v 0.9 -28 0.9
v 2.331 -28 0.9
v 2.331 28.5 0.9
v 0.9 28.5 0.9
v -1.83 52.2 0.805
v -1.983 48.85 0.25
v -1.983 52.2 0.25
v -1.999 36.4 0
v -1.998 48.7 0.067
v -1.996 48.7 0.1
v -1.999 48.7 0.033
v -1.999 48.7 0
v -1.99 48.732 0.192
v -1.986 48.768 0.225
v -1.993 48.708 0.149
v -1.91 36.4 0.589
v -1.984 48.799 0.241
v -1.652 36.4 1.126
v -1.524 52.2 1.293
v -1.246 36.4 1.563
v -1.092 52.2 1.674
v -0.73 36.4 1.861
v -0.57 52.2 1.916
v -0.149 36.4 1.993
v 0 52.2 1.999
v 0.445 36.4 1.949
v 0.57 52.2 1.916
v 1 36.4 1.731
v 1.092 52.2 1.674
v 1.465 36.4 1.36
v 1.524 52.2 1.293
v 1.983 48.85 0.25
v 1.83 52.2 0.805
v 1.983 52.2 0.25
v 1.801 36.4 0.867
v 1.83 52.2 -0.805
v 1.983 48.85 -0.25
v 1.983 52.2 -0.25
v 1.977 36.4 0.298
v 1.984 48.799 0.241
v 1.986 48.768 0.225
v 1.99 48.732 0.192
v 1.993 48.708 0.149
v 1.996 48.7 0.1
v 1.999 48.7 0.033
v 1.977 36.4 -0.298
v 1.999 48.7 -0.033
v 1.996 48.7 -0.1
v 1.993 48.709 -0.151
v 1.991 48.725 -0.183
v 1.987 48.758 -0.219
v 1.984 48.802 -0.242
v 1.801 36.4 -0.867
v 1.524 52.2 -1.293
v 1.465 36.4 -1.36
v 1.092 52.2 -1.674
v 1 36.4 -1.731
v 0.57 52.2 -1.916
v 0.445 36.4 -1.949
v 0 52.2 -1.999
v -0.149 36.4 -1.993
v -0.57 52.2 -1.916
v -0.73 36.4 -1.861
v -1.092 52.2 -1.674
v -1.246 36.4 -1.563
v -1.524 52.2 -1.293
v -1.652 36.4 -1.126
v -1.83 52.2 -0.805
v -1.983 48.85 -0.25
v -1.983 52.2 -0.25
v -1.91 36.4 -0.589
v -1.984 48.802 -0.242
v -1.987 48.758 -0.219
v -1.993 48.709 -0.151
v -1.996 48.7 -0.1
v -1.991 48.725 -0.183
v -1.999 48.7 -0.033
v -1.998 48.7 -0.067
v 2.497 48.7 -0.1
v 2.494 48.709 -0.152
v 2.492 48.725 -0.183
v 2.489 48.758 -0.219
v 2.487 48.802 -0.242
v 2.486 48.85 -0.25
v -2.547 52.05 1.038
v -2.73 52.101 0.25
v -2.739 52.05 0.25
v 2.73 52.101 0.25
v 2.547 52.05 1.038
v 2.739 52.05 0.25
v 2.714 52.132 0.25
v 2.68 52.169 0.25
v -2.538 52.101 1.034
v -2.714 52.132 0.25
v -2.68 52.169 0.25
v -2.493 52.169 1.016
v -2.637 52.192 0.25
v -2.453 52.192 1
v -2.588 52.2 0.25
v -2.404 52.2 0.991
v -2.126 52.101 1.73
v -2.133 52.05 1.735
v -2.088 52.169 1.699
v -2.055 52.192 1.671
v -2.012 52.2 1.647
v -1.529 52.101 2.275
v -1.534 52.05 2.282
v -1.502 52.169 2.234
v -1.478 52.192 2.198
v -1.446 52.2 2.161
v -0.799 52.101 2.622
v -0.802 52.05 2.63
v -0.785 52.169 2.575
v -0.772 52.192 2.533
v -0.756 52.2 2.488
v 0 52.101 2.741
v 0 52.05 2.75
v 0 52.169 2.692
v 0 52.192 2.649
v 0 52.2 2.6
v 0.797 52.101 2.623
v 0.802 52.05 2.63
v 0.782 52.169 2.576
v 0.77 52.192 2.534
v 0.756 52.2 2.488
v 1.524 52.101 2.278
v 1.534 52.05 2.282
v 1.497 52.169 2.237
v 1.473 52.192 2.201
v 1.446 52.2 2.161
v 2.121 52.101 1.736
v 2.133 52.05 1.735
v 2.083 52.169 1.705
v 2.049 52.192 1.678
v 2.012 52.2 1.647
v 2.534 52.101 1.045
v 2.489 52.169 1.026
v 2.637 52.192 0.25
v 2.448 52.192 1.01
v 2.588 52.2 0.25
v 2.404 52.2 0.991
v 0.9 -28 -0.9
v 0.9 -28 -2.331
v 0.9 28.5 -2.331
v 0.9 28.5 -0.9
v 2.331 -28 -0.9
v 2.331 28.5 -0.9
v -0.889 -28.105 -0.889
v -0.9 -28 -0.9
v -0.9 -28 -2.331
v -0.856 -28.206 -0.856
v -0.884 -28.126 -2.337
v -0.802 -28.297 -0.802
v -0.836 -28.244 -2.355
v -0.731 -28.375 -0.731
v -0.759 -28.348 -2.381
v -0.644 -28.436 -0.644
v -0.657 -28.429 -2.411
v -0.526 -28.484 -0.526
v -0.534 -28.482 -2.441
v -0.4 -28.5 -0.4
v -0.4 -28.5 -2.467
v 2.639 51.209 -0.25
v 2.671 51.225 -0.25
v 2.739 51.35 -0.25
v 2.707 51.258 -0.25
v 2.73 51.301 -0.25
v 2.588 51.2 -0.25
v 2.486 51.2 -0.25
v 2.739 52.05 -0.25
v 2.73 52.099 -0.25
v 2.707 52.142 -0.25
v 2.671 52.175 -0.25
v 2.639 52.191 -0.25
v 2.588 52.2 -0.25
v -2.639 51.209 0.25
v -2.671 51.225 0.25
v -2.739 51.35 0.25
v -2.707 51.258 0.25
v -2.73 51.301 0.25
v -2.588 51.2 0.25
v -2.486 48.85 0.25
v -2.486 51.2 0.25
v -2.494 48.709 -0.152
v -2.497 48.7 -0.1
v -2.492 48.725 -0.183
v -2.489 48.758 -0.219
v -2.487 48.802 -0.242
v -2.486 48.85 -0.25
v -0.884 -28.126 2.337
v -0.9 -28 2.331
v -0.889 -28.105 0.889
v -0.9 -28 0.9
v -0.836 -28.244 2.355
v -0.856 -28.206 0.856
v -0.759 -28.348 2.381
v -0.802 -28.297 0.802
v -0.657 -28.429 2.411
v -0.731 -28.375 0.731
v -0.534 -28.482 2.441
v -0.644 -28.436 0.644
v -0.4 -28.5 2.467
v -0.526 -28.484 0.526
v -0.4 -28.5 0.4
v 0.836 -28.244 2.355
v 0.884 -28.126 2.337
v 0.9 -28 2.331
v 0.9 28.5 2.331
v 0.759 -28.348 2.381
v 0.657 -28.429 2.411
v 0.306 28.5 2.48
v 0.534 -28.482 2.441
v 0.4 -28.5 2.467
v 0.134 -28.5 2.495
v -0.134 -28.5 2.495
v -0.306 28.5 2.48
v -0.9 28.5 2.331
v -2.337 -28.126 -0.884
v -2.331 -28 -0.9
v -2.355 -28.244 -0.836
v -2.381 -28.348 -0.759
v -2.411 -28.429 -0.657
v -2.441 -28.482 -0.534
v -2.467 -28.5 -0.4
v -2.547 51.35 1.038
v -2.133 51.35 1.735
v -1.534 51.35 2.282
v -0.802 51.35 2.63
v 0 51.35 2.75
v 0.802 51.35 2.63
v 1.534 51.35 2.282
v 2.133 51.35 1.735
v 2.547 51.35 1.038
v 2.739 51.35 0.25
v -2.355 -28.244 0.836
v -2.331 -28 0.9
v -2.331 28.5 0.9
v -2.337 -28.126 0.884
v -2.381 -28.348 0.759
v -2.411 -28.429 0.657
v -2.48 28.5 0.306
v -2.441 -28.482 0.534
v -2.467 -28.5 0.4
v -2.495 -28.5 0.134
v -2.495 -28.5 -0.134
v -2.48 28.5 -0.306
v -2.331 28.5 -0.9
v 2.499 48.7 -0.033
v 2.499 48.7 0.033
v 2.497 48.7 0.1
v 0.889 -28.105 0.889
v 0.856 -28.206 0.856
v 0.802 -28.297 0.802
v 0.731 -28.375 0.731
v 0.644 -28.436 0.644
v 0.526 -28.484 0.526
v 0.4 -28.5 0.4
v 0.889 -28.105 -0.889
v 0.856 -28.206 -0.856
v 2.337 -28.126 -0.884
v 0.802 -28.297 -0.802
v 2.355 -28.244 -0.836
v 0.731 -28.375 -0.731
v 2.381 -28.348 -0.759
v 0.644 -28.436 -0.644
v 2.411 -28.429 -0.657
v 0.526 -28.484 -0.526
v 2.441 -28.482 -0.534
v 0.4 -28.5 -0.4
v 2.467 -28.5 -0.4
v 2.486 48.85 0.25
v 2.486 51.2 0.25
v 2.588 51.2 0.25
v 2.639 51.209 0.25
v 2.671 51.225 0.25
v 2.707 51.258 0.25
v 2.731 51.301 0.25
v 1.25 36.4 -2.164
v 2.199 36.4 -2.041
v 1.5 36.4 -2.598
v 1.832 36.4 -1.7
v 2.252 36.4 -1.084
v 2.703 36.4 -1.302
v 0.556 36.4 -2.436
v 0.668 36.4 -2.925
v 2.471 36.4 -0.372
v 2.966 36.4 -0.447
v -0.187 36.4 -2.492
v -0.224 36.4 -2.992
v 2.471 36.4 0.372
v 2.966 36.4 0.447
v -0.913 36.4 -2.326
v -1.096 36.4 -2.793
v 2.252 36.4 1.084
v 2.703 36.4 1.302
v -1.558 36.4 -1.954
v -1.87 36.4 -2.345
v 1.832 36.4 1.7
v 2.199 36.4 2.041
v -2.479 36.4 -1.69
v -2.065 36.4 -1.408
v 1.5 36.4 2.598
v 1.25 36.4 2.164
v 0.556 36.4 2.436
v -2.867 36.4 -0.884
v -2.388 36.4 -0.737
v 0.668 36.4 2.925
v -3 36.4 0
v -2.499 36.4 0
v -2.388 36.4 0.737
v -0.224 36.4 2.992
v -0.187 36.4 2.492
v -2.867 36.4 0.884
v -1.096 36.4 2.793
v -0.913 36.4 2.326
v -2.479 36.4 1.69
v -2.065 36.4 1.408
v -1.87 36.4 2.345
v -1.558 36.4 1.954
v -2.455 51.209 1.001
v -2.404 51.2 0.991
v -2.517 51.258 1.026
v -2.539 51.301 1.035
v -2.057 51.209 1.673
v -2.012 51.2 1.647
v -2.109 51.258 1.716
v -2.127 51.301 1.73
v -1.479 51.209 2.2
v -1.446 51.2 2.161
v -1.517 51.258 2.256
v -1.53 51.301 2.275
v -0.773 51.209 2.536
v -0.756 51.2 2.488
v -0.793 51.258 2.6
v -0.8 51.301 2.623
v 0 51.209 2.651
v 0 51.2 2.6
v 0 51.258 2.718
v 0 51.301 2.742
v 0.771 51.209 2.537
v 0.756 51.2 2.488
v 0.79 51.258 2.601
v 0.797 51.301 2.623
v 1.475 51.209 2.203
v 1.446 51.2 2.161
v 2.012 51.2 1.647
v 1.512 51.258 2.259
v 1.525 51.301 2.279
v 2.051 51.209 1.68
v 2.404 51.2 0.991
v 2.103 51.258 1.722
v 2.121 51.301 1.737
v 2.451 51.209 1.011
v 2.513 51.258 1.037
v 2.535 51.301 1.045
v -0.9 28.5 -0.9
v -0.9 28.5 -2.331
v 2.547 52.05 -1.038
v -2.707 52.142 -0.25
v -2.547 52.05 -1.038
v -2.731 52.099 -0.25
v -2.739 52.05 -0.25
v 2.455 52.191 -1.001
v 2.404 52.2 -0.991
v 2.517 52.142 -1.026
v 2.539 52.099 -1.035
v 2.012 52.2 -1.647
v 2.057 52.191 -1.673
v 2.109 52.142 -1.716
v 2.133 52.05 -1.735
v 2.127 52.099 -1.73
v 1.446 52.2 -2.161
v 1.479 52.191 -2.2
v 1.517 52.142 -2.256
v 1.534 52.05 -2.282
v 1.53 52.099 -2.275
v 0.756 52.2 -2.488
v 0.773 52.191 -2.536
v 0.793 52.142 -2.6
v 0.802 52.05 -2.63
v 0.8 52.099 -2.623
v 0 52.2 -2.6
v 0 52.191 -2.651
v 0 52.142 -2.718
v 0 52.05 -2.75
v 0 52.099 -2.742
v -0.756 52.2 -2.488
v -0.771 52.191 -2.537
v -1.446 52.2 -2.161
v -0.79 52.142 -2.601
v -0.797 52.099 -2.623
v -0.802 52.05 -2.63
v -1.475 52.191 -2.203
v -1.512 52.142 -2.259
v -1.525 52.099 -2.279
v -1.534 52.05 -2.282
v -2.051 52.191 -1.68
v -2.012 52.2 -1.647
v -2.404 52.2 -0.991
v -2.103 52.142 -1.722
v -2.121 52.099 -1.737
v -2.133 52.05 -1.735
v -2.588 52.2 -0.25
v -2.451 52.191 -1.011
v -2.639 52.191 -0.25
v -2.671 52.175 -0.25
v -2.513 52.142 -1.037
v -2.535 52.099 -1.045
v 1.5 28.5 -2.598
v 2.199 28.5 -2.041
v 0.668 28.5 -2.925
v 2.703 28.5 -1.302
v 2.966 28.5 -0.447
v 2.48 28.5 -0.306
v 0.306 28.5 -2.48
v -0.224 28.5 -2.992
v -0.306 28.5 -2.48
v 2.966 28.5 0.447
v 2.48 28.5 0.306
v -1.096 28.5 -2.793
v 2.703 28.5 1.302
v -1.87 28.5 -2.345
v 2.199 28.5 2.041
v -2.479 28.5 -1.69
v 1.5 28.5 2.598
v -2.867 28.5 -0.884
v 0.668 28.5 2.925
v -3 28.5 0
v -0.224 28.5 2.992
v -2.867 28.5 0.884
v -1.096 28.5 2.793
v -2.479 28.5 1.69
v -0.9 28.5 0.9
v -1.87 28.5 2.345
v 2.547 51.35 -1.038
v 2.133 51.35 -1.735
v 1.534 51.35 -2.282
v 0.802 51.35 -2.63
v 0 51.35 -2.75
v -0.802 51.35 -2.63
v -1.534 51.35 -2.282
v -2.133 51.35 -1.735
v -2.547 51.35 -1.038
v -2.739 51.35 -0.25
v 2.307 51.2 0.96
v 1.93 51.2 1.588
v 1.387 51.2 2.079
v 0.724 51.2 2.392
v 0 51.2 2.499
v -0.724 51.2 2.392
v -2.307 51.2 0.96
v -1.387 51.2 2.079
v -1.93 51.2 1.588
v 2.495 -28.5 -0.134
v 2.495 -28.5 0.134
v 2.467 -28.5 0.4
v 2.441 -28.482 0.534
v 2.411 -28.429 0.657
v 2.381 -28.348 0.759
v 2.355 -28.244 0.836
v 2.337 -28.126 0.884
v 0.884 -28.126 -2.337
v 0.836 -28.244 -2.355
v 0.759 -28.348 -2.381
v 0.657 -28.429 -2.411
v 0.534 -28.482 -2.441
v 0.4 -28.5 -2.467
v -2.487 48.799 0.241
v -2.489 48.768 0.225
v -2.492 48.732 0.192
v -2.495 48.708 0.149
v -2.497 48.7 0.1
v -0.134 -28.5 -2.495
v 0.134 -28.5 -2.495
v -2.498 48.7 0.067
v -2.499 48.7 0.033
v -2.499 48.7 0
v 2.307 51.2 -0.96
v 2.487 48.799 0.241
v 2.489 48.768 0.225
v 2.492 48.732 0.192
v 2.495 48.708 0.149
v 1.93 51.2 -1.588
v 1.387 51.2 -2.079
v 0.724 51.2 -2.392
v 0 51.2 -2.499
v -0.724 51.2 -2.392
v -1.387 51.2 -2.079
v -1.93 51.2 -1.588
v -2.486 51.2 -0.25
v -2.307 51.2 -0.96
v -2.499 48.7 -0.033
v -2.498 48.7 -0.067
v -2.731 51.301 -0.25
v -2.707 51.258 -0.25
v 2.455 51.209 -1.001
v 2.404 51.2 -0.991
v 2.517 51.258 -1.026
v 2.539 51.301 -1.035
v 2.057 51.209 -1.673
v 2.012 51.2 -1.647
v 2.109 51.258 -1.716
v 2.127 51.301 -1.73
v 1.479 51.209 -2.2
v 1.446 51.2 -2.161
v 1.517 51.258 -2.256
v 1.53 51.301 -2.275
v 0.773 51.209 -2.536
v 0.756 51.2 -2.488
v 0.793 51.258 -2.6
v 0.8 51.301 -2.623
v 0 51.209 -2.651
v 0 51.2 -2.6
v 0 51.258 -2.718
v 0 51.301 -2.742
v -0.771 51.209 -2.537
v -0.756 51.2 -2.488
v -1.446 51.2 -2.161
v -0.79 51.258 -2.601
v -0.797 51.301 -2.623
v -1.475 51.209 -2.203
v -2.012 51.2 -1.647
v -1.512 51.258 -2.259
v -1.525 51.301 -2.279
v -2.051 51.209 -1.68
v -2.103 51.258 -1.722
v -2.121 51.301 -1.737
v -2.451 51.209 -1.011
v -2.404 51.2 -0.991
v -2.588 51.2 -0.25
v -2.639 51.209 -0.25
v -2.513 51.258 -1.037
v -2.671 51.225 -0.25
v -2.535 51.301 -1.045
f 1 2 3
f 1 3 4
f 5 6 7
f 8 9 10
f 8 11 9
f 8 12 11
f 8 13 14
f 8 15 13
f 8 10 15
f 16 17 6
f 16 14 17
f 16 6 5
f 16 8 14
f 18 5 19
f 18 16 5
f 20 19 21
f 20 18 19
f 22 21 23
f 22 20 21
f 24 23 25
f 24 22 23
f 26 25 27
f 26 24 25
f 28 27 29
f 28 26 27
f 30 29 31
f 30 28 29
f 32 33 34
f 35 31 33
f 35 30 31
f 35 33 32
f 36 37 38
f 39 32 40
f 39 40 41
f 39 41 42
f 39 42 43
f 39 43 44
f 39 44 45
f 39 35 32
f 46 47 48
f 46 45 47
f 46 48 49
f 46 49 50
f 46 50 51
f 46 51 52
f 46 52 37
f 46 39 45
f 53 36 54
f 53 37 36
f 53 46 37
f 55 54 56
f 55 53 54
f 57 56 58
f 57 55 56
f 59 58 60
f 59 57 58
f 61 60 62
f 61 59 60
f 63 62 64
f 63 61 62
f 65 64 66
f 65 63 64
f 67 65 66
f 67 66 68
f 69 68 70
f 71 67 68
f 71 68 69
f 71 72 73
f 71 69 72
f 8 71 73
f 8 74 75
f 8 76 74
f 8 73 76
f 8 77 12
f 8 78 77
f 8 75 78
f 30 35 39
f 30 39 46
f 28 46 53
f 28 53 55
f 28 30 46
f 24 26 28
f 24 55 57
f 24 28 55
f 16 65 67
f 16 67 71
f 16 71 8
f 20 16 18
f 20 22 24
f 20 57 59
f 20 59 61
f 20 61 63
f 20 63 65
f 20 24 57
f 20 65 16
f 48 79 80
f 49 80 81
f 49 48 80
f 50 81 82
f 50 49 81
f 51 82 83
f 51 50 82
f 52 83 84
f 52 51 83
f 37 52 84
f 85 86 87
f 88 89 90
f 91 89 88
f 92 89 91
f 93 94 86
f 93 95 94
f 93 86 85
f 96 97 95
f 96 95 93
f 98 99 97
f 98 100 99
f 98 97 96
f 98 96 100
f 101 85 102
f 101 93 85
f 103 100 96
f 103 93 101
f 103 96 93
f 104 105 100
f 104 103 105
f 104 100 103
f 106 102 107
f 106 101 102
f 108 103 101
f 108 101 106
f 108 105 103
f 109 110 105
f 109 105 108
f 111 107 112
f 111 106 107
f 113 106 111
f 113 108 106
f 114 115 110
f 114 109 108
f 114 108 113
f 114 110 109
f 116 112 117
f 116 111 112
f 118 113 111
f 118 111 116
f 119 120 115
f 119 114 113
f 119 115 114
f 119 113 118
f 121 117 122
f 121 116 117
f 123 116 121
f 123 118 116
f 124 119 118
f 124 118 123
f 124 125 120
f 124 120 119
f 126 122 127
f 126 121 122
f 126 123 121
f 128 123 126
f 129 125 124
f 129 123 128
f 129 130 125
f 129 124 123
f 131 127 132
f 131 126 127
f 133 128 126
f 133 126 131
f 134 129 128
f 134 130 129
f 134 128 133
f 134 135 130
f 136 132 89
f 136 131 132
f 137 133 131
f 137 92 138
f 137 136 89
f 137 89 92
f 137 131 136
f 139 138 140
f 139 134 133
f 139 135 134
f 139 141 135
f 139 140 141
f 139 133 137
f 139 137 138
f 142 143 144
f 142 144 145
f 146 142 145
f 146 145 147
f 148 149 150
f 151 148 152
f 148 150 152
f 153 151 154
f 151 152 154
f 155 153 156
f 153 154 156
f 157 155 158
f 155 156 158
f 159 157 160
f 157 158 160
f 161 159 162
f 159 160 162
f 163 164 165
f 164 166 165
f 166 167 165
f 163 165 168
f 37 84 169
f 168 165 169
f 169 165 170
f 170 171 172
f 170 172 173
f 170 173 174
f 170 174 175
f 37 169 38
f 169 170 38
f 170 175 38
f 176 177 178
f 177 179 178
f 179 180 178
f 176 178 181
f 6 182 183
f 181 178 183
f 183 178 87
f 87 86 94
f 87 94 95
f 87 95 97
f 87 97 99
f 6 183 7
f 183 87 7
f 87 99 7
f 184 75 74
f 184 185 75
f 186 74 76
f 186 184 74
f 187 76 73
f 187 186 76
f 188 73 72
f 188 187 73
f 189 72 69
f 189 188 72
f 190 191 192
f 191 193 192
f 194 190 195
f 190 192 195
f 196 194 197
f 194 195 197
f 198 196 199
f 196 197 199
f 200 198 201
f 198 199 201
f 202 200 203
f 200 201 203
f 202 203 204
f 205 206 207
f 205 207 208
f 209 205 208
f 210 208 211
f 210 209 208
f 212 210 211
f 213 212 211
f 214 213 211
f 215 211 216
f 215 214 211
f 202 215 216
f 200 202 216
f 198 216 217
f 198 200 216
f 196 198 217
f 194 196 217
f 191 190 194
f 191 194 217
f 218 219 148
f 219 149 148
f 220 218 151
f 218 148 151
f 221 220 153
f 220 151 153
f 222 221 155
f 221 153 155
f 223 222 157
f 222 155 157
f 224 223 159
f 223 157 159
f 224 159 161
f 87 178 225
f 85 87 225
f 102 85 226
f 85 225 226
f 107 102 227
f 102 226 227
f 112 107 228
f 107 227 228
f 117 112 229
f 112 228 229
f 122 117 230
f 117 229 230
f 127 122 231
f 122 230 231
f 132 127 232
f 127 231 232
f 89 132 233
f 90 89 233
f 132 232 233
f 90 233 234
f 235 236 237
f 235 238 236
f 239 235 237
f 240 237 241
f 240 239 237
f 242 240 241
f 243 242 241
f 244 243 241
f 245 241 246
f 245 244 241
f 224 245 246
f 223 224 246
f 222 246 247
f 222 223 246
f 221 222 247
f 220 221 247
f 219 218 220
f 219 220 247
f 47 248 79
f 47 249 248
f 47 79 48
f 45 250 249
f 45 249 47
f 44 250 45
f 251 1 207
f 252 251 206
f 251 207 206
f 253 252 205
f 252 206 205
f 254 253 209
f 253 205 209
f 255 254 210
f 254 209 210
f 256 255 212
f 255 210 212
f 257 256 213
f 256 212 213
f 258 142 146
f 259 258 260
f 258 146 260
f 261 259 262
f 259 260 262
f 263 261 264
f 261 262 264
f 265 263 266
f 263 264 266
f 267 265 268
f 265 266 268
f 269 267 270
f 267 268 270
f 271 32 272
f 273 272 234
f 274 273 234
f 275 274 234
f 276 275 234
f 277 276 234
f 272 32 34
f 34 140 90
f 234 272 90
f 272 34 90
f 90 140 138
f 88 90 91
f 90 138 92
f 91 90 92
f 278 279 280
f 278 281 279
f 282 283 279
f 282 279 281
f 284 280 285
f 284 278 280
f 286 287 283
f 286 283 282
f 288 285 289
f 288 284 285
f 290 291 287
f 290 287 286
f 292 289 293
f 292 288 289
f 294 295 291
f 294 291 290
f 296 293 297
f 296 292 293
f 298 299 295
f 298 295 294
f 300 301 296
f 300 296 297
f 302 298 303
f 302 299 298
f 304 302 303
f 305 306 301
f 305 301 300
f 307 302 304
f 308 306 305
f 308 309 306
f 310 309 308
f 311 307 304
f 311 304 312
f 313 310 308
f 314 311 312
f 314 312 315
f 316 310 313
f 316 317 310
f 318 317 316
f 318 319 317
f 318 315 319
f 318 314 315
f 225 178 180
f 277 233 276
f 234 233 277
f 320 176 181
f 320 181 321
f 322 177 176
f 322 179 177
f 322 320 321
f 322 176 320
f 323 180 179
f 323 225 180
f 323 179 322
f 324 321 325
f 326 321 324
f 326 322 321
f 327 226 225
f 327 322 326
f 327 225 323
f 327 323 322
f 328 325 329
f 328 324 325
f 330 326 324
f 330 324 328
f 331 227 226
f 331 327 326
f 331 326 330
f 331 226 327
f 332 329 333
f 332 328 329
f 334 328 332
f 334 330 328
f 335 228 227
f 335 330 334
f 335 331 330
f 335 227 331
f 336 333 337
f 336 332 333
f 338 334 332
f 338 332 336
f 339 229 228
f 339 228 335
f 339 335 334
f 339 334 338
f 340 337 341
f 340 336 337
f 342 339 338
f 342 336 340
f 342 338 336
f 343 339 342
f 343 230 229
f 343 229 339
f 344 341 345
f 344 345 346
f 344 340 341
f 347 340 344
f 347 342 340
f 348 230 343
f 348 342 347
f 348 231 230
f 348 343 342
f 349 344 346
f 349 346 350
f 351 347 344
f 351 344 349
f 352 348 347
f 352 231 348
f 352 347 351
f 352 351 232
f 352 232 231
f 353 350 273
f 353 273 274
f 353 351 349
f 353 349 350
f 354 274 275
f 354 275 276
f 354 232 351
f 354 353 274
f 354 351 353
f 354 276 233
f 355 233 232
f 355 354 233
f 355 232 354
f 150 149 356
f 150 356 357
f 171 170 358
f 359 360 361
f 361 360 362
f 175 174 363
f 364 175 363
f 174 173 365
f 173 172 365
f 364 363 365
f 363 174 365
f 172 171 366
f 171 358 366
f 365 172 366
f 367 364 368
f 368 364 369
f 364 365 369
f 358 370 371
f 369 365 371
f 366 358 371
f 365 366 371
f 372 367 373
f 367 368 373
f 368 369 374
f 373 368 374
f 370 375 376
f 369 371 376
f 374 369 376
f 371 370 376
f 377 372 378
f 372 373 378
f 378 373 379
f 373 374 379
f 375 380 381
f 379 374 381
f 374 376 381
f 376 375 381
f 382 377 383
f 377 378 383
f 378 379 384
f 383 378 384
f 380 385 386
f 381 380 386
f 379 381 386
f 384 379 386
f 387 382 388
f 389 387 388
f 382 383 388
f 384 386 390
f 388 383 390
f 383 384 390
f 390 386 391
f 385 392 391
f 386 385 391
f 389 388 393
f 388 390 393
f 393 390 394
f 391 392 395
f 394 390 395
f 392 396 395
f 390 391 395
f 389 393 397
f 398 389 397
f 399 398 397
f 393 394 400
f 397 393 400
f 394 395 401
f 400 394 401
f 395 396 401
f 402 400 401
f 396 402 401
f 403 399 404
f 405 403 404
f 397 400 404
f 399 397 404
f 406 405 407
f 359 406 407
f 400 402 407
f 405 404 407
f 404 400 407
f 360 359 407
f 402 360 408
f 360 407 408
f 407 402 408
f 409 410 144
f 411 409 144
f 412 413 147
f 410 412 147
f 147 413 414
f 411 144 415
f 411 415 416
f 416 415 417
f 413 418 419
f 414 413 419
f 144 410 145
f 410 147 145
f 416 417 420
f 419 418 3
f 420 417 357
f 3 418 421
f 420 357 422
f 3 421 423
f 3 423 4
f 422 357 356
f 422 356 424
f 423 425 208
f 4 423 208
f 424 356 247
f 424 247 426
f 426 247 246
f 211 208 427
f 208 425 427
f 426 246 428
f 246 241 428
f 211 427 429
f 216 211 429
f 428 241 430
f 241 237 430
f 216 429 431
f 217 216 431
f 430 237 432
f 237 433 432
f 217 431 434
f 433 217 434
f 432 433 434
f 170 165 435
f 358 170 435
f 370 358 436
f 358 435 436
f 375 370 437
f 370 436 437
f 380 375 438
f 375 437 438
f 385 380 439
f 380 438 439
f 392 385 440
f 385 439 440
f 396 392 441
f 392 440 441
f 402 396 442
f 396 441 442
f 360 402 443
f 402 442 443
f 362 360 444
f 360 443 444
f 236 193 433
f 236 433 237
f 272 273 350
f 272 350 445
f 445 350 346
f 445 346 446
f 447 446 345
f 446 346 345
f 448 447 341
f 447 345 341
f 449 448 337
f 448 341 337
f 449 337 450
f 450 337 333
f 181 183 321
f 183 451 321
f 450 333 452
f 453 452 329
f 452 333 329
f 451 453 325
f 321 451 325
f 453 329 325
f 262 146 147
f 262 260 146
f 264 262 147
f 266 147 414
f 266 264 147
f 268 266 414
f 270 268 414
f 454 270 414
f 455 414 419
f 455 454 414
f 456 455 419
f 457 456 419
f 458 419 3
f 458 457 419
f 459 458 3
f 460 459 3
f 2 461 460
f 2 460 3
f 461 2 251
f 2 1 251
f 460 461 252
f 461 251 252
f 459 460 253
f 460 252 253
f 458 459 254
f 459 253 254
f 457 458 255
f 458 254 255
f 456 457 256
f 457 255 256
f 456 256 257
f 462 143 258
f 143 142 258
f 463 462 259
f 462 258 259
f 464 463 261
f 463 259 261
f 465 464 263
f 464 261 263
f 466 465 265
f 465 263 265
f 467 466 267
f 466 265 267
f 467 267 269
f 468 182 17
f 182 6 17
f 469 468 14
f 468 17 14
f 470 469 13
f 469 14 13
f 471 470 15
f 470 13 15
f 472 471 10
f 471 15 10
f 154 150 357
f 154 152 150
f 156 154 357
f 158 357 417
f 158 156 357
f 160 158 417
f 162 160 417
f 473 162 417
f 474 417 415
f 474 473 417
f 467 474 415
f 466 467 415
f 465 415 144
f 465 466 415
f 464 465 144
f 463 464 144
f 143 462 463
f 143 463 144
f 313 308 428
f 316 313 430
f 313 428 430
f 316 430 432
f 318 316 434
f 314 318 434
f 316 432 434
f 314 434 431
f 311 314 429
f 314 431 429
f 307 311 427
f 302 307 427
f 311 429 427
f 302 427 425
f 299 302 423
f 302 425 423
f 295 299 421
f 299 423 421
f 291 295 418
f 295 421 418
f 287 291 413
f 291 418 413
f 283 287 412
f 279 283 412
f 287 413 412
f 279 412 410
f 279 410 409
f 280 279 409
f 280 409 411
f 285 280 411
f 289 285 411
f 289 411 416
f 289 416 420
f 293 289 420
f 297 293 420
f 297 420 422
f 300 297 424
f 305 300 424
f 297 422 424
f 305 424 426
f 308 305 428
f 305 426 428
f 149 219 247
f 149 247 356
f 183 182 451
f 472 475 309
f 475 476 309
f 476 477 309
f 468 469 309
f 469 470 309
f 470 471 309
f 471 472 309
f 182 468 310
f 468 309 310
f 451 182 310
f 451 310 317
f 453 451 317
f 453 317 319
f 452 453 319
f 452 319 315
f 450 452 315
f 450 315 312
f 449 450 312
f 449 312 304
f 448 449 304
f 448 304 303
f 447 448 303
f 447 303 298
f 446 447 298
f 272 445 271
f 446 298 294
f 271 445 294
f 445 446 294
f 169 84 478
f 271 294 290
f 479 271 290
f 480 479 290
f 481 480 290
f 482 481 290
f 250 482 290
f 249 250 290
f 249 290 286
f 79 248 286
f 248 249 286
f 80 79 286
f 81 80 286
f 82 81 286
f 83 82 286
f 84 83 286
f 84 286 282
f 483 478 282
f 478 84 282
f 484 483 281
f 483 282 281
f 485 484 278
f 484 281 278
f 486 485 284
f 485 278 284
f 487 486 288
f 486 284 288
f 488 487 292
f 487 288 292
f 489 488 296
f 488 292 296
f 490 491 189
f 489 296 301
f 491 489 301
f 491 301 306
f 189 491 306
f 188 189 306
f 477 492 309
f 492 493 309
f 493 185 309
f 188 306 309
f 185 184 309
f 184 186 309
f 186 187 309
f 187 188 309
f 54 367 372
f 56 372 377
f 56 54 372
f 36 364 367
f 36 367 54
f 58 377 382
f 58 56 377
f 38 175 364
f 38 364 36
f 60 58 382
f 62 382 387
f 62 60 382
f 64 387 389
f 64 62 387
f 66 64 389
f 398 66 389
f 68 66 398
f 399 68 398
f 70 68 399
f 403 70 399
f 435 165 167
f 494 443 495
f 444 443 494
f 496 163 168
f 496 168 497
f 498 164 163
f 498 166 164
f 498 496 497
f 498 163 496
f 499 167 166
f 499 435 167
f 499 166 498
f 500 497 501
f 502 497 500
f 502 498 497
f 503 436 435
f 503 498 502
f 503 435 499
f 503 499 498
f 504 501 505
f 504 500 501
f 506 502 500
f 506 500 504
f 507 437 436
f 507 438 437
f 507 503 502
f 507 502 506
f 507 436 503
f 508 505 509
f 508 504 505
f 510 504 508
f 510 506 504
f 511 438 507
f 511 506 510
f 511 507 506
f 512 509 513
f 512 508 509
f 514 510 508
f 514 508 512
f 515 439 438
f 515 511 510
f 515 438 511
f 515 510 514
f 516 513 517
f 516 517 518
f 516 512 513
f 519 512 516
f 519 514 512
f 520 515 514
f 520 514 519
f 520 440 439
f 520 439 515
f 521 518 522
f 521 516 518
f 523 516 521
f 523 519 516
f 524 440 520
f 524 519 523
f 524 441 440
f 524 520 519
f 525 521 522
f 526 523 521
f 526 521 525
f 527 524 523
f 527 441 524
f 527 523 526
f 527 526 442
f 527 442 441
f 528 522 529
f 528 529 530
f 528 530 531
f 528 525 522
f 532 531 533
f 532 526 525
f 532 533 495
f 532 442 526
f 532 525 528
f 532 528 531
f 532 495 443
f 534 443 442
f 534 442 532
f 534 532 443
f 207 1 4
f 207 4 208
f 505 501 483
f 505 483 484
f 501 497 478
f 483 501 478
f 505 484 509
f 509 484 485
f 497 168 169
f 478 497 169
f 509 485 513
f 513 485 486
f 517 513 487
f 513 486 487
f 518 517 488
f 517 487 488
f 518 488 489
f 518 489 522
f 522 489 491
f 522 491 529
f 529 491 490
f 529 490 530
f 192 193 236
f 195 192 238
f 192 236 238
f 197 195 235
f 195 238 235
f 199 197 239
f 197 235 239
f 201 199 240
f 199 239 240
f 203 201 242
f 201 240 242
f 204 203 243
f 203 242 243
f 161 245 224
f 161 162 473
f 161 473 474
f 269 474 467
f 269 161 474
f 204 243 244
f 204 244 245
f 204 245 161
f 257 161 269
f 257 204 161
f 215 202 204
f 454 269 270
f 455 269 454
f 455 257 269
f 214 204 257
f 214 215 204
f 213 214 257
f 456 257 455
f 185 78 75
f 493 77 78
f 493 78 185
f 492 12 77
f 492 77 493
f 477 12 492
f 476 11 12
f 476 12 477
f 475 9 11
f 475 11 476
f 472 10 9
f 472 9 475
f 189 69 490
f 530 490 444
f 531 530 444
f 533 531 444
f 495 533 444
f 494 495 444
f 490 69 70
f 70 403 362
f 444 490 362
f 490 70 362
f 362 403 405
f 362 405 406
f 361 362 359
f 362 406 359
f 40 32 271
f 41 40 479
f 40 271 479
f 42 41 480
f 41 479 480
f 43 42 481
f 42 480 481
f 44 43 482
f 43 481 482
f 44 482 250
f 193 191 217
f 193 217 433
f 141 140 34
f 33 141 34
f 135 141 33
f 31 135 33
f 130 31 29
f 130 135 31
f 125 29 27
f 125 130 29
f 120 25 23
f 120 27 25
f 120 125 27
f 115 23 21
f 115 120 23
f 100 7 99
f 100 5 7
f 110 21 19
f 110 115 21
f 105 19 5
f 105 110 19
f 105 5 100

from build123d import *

# Parameters (mm, degrees)
F1_DEPTH  = 28.5
F2_R      = 0.5
F3_R      = 3
F4_DEPTH  = 7.9
F5_R      = 2.499
F5_R_2    = 1.999
F6_DEPTH  = 14.8
F7_R      = 2.75
F7_R_2    = 2.499
F7_R_3    = 1.999
F8_DEPTH  = 1
F10_DEPTH = 3.5
F11_R     = 0.15
F12_R     = 0.15


# Not quite as in the source:
# - a feature names something its author has since deleted; it is built from what else it names


with BuildPart() as f1:
    # F0 (on Front) → F1 (new body, symmetric)
    with BuildSketch(Plane.XZ):
        with BuildLine():
            Line((-0.9, 0.9), (-2.3313088598, 0.9))
            ThreePointArc((-2.3313088598, 0.9), (-2.499, 0), (-2.3313088598, -0.9))
            Line((-2.3313088598, -0.9), (-0.9, -0.9))
            Line((-0.9, -0.9), (-0.9, -2.3313088598))
            ThreePointArc((-0.9, -2.3313088598), (0, -2.499), (0.9, -2.3313088598))
            Line((0.9, -2.3313088598), (0.9, -0.9))
            Line((0.9, -0.9), (2.3313088598, -0.9))
            ThreePointArc((2.3313088598, -0.9), (2.499, 0), (2.3313088598, 0.9))
            Line((2.3313088598, 0.9), (0.9, 0.9))
            Line((0.9, 0.9), (0.9, 2.3313088598))
            ThreePointArc((0.9, 2.3313088598), (0, 2.499), (-0.9, 2.3313088598))
            Line((-0.9, 2.3313088598), (-0.9, 0.9))
        make_face()
    extrude(amount=F1_DEPTH, both=True)

    # F2
    f2_edges = [f1.edges().sort_by_distance(p)[0] for p in [
        (0.9, -28.5, 1.615654),
        (-0.9, -28.5, 1.615654),
        (1.615654, -28.5, 0.9),
        (1.615654, -28.5, -0.9),
        (0.9, -28.5, -1.615654),
        (-0.9, -28.5, -1.615654),
        (-1.615654, -28.5, -0.9),
        (-1.615654, -28.5, 0.9),
    ]]
    fillet(f2_edges, radius=F2_R)

    # F3 (on face) → F4 (join)
    with BuildSketch(Plane(origin=(0, 28.5, 0), x_dir=(-1, 0, 0), z_dir=(0, 1, 0))):
        Circle(F3_R)
        with BuildLine():
            Line((-2.3313088598, 0.9), (-0.9, 0.9))
            Line((-0.9, 0.9), (-0.9, 2.3313088598))
            ThreePointArc((-0.9, 2.3313088598), (0, 2.499), (0.9, 2.3313088598))
            Line((0.9, 2.3313088598), (0.9, 0.9))
            Line((0.9, 0.9), (2.3313088598, 0.9))
            ThreePointArc((2.3313088598, 0.9), (2.499, 0), (2.3313088598, -0.9))
            Line((2.3313088598, -0.9), (0.9, -0.9))
            Line((0.9, -0.9), (0.9, -2.3313088598))
            ThreePointArc((0.9, -2.3313088598), (0, -2.499), (-0.9, -2.3313088598))
            Line((-0.9, -2.3313088598), (-0.9, -0.9))
            Line((-0.9, -0.9), (-2.3313088598, -0.9))
            ThreePointArc((-2.3313088598, -0.9), (-2.499, 0), (-2.3313088598, 0.9))
        make_face(mode=Mode.SUBTRACT)
        with BuildLine():
            Line((-0.9, 2.3313088598), (-0.9, 0.9))
            Line((-0.9, 0.9), (-2.3313088598, 0.9))
            ThreePointArc((-2.3313088598, 0.9), (-2.499, 0), (-2.3313088598, -0.9))
            Line((-2.3313088598, -0.9), (-0.9, -0.9))
            Line((-0.9, -0.9), (-0.9, -2.3313088598))
            ThreePointArc((-0.9, -2.3313088598), (0, -2.499), (0.9, -2.3313088598))
            Line((0.9, -2.3313088598), (0.9, -0.9))
            Line((0.9, -0.9), (2.3313088598, -0.9))
            ThreePointArc((2.3313088598, -0.9), (2.499, 0), (2.3313088598, 0.9))
            Line((2.3313088598, 0.9), (0.9, 0.9))
            Line((0.9, 0.9), (0.9, 2.3313088598))
            ThreePointArc((0.9, 2.3313088598), (0, 2.499), (-0.9, 2.3313088598))
        make_face()
    extrude(amount=F4_DEPTH)

    # F5 (on face) → F6 (join)
    with BuildSketch(Plane(origin=(0, 36.4, 0), x_dir=(-1, 0, 0), z_dir=(0, 1, 0))):
        Circle(F5_R)
        Circle(F5_R_2, mode=Mode.SUBTRACT)
    extrude(amount=F6_DEPTH)

    # F7 (on face) → F8 (join)
    with BuildSketch(Plane(origin=(0, 51.2, 0), x_dir=(-1, 0, 0), z_dir=(0, 1, 0))):
        Circle(F7_R)
        Circle(F7_R_2, mode=Mode.SUBTRACT)
        Circle(F7_R_2)
        Circle(F7_R_3, mode=Mode.SUBTRACT)
    extrude(amount=F8_DEPTH)

    # F9 (on face) → F10 (cut)
    with BuildSketch(Plane(origin=(0, 52.2, 0), x_dir=(-1, 0, 0), z_dir=(0, 1, 0))):
        with BuildLine():
            ThreePointArc((-1.983305574, -0.25), (-1.999, 0), (-1.983305574, 0.25))
            Line((-1.983305574, 0.25), (-2.7386127875, 0.25))
            ThreePointArc((-2.7386127875, 0.25), (-2.75, 0), (-2.7386127875, -0.25))
            Line((-2.7386127875, -0.25), (-1.983305574, -0.25))
        make_face()
        with BuildLine():
            ThreePointArc((2.7386127875, -0.25), (2.75, 0), (2.7386127875, 0.25))
            Line((2.7386127875, 0.25), (1.983305574, 0.25))
            ThreePointArc((1.983305574, 0.25), (1.999, 0), (1.983305574, -0.25))
            Line((1.983305574, -0.25), (2.7386127875, -0.25))
        make_face()
    extrude(amount=-F10_DEPTH, mode=Mode.SUBTRACT)

    # F11
    f11_edges = [f1.edges().sort_by_distance(p)[0] for p in [
        (2.234885, 48.7, -0.25),
        (2.234885, 48.7, 0.25),
        (-2.234885, 48.7, -0.25),
        (-2.234885, 48.7, 0.25),
    ]]
    fillet(f11_edges, radius=F11_R)

    # F12
    f12_edges = [f1.edges().sort_by_distance(p)[0] for p in [
        (0, 52.2, 2.75),
        (0, 52.2, -2.75),
        (0, 51.2, -2.75),
        (0, 51.2, 2.75),
    ]]
    fillet(f12_edges, radius=F12_R)


solid = f1.part
